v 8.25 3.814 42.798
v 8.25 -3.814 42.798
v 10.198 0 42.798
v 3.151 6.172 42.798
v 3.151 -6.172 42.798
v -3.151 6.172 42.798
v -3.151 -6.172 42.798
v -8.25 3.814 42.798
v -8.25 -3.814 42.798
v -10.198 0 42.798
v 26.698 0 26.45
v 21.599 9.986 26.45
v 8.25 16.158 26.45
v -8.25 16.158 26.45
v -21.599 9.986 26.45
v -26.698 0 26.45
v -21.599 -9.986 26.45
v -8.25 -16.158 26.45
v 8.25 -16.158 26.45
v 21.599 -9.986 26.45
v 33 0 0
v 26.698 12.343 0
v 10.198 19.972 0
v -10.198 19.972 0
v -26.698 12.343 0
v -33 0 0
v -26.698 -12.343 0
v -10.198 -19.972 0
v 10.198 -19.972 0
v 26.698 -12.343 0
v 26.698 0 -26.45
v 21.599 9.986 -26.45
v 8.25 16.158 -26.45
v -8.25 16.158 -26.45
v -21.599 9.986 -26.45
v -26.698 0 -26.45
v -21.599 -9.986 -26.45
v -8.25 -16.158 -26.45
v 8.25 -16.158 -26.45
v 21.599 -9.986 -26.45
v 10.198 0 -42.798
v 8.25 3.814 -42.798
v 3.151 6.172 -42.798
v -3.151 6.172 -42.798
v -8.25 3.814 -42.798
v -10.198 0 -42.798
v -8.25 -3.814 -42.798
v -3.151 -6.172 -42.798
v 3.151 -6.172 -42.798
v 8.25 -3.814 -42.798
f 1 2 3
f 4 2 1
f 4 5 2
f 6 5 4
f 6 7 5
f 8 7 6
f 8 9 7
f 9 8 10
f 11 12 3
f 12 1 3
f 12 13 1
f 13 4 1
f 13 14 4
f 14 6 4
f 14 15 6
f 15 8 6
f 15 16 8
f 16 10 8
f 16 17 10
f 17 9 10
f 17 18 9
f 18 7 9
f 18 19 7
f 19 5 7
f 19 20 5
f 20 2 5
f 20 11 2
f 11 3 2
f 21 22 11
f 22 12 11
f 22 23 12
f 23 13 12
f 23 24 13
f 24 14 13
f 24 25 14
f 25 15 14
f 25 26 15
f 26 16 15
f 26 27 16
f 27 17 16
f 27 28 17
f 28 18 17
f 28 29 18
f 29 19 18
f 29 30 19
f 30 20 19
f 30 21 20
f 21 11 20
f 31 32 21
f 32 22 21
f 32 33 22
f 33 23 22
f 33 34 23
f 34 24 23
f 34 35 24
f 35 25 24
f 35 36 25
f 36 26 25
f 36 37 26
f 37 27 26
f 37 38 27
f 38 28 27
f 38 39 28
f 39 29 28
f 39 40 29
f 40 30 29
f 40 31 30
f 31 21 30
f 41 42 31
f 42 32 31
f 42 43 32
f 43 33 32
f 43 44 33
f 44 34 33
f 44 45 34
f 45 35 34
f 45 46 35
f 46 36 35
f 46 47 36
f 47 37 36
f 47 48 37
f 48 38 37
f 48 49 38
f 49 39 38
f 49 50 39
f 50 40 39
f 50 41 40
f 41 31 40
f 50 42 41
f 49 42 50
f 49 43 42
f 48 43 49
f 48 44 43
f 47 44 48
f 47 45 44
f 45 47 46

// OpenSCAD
// Generated by SolidPython 1.0.1 on 2020-07-29 00:46:49


scale(v = [11, 7, 15]) {
	sphere(r = 3);
}
/***********************************************
*********      SolidPython code:      **********
************************************************
 
# import packages: SolidPython
from solid import *
from solid.utils import *
from itertools import chain, combinations, permutations


class Resize:

    def __init__(self, scad_file):
        self.scad_file = scad_file
        #self.scad_file = import_scad(scad_file)
        # cone/cylinder param:
        self.r1 = 0
        self.r2 = 0
        self.h = 0
        # rectangular prism param:
        self.w = 0
        self.l = 0
        # ellipse param:
        self.r = 0

    # import OpenScad code (file name corresponds to shape)


    # classify shape + parameters
    def assign(self, param1, param2, param3):
        if self.scad_file == 'cone.scad':
            self.r1 = param1
            self.r2 = param2
            self.h = param3
        elif self.scad_file == 'cylinder.scad':
            self.r1 = param1
            self.r2 = param2
            self.h = param3
        elif self.scad_file == 'rectangularPrism.scad':
            self.h = param1
            self.l = param2
            self.w = param3
        else:
            self.r = param1
            self.h = param2

    # resize parameters
    def iterate(self):
        x = range(3, 20, 2)
        i = 1
        if self.scad_file == 'cone.scad':
            tempList = list(permutations(x, 2))
            for temp in tempList:
                param1 = temp[0]
                param2 = temp[1]
                filepath = 'produced_scad_files/' + 'cone' + str(param1) + '_' + str(param2) + '_' + '.scad'
                scad_render_to_file(cylinder(h=param1, r1=param2, r2=0), filepath)

        elif self.scad_file == 'cylinder.scad':
            tempList = list(permutations(x, 3))
            for temp in tempList:
                param1 = temp[0]
                param2 = temp[1]
                filepath = 'produced_scad_files/' + 'cylinder' + str(param1) + '_' + str(param2) + '_' + '.scad'
                scad_render_to_file(cylinder(h=param1, r1=param2, r2=param2), filepath)

        elif self.scad_file == 'rectangularPrism.scad':
            tempList = list(permutations(x, 3))
            for temp in tempList:
                param1 = temp[0]
                param2 = temp[1]
                param3 = temp[2]
                filepath = 'produced_scad_files/' + 'rectangularPrism' + str(param1) + '_' + str(param2) + '_' + str(
                    param3) + '.scad'
                scad_render_to_file(cube(size=(param1, param2, param3)), filepath)

        elif self.scad_file == 'ellipse.scad':
            tempList = list(permutations(x, 4))
            for temp in tempList:
                param1 = temp[0]
                param2 = temp[1]
                param3 = temp[2]
                param4 = temp[3]
                filepath = 'produced_scad_files/' + 'ellipse' + str(param1) + '_' + str(param2) + '_' + str(param3) + '_' + str(param4) + '.scad'
                scad_render_to_file(scale([param1, param2, param3])(sphere(r=param4)), filepath)

    def render_to_scadfile(self):
        scad_render_to_file(scad, 'example.scad') 
 
************************************************/
